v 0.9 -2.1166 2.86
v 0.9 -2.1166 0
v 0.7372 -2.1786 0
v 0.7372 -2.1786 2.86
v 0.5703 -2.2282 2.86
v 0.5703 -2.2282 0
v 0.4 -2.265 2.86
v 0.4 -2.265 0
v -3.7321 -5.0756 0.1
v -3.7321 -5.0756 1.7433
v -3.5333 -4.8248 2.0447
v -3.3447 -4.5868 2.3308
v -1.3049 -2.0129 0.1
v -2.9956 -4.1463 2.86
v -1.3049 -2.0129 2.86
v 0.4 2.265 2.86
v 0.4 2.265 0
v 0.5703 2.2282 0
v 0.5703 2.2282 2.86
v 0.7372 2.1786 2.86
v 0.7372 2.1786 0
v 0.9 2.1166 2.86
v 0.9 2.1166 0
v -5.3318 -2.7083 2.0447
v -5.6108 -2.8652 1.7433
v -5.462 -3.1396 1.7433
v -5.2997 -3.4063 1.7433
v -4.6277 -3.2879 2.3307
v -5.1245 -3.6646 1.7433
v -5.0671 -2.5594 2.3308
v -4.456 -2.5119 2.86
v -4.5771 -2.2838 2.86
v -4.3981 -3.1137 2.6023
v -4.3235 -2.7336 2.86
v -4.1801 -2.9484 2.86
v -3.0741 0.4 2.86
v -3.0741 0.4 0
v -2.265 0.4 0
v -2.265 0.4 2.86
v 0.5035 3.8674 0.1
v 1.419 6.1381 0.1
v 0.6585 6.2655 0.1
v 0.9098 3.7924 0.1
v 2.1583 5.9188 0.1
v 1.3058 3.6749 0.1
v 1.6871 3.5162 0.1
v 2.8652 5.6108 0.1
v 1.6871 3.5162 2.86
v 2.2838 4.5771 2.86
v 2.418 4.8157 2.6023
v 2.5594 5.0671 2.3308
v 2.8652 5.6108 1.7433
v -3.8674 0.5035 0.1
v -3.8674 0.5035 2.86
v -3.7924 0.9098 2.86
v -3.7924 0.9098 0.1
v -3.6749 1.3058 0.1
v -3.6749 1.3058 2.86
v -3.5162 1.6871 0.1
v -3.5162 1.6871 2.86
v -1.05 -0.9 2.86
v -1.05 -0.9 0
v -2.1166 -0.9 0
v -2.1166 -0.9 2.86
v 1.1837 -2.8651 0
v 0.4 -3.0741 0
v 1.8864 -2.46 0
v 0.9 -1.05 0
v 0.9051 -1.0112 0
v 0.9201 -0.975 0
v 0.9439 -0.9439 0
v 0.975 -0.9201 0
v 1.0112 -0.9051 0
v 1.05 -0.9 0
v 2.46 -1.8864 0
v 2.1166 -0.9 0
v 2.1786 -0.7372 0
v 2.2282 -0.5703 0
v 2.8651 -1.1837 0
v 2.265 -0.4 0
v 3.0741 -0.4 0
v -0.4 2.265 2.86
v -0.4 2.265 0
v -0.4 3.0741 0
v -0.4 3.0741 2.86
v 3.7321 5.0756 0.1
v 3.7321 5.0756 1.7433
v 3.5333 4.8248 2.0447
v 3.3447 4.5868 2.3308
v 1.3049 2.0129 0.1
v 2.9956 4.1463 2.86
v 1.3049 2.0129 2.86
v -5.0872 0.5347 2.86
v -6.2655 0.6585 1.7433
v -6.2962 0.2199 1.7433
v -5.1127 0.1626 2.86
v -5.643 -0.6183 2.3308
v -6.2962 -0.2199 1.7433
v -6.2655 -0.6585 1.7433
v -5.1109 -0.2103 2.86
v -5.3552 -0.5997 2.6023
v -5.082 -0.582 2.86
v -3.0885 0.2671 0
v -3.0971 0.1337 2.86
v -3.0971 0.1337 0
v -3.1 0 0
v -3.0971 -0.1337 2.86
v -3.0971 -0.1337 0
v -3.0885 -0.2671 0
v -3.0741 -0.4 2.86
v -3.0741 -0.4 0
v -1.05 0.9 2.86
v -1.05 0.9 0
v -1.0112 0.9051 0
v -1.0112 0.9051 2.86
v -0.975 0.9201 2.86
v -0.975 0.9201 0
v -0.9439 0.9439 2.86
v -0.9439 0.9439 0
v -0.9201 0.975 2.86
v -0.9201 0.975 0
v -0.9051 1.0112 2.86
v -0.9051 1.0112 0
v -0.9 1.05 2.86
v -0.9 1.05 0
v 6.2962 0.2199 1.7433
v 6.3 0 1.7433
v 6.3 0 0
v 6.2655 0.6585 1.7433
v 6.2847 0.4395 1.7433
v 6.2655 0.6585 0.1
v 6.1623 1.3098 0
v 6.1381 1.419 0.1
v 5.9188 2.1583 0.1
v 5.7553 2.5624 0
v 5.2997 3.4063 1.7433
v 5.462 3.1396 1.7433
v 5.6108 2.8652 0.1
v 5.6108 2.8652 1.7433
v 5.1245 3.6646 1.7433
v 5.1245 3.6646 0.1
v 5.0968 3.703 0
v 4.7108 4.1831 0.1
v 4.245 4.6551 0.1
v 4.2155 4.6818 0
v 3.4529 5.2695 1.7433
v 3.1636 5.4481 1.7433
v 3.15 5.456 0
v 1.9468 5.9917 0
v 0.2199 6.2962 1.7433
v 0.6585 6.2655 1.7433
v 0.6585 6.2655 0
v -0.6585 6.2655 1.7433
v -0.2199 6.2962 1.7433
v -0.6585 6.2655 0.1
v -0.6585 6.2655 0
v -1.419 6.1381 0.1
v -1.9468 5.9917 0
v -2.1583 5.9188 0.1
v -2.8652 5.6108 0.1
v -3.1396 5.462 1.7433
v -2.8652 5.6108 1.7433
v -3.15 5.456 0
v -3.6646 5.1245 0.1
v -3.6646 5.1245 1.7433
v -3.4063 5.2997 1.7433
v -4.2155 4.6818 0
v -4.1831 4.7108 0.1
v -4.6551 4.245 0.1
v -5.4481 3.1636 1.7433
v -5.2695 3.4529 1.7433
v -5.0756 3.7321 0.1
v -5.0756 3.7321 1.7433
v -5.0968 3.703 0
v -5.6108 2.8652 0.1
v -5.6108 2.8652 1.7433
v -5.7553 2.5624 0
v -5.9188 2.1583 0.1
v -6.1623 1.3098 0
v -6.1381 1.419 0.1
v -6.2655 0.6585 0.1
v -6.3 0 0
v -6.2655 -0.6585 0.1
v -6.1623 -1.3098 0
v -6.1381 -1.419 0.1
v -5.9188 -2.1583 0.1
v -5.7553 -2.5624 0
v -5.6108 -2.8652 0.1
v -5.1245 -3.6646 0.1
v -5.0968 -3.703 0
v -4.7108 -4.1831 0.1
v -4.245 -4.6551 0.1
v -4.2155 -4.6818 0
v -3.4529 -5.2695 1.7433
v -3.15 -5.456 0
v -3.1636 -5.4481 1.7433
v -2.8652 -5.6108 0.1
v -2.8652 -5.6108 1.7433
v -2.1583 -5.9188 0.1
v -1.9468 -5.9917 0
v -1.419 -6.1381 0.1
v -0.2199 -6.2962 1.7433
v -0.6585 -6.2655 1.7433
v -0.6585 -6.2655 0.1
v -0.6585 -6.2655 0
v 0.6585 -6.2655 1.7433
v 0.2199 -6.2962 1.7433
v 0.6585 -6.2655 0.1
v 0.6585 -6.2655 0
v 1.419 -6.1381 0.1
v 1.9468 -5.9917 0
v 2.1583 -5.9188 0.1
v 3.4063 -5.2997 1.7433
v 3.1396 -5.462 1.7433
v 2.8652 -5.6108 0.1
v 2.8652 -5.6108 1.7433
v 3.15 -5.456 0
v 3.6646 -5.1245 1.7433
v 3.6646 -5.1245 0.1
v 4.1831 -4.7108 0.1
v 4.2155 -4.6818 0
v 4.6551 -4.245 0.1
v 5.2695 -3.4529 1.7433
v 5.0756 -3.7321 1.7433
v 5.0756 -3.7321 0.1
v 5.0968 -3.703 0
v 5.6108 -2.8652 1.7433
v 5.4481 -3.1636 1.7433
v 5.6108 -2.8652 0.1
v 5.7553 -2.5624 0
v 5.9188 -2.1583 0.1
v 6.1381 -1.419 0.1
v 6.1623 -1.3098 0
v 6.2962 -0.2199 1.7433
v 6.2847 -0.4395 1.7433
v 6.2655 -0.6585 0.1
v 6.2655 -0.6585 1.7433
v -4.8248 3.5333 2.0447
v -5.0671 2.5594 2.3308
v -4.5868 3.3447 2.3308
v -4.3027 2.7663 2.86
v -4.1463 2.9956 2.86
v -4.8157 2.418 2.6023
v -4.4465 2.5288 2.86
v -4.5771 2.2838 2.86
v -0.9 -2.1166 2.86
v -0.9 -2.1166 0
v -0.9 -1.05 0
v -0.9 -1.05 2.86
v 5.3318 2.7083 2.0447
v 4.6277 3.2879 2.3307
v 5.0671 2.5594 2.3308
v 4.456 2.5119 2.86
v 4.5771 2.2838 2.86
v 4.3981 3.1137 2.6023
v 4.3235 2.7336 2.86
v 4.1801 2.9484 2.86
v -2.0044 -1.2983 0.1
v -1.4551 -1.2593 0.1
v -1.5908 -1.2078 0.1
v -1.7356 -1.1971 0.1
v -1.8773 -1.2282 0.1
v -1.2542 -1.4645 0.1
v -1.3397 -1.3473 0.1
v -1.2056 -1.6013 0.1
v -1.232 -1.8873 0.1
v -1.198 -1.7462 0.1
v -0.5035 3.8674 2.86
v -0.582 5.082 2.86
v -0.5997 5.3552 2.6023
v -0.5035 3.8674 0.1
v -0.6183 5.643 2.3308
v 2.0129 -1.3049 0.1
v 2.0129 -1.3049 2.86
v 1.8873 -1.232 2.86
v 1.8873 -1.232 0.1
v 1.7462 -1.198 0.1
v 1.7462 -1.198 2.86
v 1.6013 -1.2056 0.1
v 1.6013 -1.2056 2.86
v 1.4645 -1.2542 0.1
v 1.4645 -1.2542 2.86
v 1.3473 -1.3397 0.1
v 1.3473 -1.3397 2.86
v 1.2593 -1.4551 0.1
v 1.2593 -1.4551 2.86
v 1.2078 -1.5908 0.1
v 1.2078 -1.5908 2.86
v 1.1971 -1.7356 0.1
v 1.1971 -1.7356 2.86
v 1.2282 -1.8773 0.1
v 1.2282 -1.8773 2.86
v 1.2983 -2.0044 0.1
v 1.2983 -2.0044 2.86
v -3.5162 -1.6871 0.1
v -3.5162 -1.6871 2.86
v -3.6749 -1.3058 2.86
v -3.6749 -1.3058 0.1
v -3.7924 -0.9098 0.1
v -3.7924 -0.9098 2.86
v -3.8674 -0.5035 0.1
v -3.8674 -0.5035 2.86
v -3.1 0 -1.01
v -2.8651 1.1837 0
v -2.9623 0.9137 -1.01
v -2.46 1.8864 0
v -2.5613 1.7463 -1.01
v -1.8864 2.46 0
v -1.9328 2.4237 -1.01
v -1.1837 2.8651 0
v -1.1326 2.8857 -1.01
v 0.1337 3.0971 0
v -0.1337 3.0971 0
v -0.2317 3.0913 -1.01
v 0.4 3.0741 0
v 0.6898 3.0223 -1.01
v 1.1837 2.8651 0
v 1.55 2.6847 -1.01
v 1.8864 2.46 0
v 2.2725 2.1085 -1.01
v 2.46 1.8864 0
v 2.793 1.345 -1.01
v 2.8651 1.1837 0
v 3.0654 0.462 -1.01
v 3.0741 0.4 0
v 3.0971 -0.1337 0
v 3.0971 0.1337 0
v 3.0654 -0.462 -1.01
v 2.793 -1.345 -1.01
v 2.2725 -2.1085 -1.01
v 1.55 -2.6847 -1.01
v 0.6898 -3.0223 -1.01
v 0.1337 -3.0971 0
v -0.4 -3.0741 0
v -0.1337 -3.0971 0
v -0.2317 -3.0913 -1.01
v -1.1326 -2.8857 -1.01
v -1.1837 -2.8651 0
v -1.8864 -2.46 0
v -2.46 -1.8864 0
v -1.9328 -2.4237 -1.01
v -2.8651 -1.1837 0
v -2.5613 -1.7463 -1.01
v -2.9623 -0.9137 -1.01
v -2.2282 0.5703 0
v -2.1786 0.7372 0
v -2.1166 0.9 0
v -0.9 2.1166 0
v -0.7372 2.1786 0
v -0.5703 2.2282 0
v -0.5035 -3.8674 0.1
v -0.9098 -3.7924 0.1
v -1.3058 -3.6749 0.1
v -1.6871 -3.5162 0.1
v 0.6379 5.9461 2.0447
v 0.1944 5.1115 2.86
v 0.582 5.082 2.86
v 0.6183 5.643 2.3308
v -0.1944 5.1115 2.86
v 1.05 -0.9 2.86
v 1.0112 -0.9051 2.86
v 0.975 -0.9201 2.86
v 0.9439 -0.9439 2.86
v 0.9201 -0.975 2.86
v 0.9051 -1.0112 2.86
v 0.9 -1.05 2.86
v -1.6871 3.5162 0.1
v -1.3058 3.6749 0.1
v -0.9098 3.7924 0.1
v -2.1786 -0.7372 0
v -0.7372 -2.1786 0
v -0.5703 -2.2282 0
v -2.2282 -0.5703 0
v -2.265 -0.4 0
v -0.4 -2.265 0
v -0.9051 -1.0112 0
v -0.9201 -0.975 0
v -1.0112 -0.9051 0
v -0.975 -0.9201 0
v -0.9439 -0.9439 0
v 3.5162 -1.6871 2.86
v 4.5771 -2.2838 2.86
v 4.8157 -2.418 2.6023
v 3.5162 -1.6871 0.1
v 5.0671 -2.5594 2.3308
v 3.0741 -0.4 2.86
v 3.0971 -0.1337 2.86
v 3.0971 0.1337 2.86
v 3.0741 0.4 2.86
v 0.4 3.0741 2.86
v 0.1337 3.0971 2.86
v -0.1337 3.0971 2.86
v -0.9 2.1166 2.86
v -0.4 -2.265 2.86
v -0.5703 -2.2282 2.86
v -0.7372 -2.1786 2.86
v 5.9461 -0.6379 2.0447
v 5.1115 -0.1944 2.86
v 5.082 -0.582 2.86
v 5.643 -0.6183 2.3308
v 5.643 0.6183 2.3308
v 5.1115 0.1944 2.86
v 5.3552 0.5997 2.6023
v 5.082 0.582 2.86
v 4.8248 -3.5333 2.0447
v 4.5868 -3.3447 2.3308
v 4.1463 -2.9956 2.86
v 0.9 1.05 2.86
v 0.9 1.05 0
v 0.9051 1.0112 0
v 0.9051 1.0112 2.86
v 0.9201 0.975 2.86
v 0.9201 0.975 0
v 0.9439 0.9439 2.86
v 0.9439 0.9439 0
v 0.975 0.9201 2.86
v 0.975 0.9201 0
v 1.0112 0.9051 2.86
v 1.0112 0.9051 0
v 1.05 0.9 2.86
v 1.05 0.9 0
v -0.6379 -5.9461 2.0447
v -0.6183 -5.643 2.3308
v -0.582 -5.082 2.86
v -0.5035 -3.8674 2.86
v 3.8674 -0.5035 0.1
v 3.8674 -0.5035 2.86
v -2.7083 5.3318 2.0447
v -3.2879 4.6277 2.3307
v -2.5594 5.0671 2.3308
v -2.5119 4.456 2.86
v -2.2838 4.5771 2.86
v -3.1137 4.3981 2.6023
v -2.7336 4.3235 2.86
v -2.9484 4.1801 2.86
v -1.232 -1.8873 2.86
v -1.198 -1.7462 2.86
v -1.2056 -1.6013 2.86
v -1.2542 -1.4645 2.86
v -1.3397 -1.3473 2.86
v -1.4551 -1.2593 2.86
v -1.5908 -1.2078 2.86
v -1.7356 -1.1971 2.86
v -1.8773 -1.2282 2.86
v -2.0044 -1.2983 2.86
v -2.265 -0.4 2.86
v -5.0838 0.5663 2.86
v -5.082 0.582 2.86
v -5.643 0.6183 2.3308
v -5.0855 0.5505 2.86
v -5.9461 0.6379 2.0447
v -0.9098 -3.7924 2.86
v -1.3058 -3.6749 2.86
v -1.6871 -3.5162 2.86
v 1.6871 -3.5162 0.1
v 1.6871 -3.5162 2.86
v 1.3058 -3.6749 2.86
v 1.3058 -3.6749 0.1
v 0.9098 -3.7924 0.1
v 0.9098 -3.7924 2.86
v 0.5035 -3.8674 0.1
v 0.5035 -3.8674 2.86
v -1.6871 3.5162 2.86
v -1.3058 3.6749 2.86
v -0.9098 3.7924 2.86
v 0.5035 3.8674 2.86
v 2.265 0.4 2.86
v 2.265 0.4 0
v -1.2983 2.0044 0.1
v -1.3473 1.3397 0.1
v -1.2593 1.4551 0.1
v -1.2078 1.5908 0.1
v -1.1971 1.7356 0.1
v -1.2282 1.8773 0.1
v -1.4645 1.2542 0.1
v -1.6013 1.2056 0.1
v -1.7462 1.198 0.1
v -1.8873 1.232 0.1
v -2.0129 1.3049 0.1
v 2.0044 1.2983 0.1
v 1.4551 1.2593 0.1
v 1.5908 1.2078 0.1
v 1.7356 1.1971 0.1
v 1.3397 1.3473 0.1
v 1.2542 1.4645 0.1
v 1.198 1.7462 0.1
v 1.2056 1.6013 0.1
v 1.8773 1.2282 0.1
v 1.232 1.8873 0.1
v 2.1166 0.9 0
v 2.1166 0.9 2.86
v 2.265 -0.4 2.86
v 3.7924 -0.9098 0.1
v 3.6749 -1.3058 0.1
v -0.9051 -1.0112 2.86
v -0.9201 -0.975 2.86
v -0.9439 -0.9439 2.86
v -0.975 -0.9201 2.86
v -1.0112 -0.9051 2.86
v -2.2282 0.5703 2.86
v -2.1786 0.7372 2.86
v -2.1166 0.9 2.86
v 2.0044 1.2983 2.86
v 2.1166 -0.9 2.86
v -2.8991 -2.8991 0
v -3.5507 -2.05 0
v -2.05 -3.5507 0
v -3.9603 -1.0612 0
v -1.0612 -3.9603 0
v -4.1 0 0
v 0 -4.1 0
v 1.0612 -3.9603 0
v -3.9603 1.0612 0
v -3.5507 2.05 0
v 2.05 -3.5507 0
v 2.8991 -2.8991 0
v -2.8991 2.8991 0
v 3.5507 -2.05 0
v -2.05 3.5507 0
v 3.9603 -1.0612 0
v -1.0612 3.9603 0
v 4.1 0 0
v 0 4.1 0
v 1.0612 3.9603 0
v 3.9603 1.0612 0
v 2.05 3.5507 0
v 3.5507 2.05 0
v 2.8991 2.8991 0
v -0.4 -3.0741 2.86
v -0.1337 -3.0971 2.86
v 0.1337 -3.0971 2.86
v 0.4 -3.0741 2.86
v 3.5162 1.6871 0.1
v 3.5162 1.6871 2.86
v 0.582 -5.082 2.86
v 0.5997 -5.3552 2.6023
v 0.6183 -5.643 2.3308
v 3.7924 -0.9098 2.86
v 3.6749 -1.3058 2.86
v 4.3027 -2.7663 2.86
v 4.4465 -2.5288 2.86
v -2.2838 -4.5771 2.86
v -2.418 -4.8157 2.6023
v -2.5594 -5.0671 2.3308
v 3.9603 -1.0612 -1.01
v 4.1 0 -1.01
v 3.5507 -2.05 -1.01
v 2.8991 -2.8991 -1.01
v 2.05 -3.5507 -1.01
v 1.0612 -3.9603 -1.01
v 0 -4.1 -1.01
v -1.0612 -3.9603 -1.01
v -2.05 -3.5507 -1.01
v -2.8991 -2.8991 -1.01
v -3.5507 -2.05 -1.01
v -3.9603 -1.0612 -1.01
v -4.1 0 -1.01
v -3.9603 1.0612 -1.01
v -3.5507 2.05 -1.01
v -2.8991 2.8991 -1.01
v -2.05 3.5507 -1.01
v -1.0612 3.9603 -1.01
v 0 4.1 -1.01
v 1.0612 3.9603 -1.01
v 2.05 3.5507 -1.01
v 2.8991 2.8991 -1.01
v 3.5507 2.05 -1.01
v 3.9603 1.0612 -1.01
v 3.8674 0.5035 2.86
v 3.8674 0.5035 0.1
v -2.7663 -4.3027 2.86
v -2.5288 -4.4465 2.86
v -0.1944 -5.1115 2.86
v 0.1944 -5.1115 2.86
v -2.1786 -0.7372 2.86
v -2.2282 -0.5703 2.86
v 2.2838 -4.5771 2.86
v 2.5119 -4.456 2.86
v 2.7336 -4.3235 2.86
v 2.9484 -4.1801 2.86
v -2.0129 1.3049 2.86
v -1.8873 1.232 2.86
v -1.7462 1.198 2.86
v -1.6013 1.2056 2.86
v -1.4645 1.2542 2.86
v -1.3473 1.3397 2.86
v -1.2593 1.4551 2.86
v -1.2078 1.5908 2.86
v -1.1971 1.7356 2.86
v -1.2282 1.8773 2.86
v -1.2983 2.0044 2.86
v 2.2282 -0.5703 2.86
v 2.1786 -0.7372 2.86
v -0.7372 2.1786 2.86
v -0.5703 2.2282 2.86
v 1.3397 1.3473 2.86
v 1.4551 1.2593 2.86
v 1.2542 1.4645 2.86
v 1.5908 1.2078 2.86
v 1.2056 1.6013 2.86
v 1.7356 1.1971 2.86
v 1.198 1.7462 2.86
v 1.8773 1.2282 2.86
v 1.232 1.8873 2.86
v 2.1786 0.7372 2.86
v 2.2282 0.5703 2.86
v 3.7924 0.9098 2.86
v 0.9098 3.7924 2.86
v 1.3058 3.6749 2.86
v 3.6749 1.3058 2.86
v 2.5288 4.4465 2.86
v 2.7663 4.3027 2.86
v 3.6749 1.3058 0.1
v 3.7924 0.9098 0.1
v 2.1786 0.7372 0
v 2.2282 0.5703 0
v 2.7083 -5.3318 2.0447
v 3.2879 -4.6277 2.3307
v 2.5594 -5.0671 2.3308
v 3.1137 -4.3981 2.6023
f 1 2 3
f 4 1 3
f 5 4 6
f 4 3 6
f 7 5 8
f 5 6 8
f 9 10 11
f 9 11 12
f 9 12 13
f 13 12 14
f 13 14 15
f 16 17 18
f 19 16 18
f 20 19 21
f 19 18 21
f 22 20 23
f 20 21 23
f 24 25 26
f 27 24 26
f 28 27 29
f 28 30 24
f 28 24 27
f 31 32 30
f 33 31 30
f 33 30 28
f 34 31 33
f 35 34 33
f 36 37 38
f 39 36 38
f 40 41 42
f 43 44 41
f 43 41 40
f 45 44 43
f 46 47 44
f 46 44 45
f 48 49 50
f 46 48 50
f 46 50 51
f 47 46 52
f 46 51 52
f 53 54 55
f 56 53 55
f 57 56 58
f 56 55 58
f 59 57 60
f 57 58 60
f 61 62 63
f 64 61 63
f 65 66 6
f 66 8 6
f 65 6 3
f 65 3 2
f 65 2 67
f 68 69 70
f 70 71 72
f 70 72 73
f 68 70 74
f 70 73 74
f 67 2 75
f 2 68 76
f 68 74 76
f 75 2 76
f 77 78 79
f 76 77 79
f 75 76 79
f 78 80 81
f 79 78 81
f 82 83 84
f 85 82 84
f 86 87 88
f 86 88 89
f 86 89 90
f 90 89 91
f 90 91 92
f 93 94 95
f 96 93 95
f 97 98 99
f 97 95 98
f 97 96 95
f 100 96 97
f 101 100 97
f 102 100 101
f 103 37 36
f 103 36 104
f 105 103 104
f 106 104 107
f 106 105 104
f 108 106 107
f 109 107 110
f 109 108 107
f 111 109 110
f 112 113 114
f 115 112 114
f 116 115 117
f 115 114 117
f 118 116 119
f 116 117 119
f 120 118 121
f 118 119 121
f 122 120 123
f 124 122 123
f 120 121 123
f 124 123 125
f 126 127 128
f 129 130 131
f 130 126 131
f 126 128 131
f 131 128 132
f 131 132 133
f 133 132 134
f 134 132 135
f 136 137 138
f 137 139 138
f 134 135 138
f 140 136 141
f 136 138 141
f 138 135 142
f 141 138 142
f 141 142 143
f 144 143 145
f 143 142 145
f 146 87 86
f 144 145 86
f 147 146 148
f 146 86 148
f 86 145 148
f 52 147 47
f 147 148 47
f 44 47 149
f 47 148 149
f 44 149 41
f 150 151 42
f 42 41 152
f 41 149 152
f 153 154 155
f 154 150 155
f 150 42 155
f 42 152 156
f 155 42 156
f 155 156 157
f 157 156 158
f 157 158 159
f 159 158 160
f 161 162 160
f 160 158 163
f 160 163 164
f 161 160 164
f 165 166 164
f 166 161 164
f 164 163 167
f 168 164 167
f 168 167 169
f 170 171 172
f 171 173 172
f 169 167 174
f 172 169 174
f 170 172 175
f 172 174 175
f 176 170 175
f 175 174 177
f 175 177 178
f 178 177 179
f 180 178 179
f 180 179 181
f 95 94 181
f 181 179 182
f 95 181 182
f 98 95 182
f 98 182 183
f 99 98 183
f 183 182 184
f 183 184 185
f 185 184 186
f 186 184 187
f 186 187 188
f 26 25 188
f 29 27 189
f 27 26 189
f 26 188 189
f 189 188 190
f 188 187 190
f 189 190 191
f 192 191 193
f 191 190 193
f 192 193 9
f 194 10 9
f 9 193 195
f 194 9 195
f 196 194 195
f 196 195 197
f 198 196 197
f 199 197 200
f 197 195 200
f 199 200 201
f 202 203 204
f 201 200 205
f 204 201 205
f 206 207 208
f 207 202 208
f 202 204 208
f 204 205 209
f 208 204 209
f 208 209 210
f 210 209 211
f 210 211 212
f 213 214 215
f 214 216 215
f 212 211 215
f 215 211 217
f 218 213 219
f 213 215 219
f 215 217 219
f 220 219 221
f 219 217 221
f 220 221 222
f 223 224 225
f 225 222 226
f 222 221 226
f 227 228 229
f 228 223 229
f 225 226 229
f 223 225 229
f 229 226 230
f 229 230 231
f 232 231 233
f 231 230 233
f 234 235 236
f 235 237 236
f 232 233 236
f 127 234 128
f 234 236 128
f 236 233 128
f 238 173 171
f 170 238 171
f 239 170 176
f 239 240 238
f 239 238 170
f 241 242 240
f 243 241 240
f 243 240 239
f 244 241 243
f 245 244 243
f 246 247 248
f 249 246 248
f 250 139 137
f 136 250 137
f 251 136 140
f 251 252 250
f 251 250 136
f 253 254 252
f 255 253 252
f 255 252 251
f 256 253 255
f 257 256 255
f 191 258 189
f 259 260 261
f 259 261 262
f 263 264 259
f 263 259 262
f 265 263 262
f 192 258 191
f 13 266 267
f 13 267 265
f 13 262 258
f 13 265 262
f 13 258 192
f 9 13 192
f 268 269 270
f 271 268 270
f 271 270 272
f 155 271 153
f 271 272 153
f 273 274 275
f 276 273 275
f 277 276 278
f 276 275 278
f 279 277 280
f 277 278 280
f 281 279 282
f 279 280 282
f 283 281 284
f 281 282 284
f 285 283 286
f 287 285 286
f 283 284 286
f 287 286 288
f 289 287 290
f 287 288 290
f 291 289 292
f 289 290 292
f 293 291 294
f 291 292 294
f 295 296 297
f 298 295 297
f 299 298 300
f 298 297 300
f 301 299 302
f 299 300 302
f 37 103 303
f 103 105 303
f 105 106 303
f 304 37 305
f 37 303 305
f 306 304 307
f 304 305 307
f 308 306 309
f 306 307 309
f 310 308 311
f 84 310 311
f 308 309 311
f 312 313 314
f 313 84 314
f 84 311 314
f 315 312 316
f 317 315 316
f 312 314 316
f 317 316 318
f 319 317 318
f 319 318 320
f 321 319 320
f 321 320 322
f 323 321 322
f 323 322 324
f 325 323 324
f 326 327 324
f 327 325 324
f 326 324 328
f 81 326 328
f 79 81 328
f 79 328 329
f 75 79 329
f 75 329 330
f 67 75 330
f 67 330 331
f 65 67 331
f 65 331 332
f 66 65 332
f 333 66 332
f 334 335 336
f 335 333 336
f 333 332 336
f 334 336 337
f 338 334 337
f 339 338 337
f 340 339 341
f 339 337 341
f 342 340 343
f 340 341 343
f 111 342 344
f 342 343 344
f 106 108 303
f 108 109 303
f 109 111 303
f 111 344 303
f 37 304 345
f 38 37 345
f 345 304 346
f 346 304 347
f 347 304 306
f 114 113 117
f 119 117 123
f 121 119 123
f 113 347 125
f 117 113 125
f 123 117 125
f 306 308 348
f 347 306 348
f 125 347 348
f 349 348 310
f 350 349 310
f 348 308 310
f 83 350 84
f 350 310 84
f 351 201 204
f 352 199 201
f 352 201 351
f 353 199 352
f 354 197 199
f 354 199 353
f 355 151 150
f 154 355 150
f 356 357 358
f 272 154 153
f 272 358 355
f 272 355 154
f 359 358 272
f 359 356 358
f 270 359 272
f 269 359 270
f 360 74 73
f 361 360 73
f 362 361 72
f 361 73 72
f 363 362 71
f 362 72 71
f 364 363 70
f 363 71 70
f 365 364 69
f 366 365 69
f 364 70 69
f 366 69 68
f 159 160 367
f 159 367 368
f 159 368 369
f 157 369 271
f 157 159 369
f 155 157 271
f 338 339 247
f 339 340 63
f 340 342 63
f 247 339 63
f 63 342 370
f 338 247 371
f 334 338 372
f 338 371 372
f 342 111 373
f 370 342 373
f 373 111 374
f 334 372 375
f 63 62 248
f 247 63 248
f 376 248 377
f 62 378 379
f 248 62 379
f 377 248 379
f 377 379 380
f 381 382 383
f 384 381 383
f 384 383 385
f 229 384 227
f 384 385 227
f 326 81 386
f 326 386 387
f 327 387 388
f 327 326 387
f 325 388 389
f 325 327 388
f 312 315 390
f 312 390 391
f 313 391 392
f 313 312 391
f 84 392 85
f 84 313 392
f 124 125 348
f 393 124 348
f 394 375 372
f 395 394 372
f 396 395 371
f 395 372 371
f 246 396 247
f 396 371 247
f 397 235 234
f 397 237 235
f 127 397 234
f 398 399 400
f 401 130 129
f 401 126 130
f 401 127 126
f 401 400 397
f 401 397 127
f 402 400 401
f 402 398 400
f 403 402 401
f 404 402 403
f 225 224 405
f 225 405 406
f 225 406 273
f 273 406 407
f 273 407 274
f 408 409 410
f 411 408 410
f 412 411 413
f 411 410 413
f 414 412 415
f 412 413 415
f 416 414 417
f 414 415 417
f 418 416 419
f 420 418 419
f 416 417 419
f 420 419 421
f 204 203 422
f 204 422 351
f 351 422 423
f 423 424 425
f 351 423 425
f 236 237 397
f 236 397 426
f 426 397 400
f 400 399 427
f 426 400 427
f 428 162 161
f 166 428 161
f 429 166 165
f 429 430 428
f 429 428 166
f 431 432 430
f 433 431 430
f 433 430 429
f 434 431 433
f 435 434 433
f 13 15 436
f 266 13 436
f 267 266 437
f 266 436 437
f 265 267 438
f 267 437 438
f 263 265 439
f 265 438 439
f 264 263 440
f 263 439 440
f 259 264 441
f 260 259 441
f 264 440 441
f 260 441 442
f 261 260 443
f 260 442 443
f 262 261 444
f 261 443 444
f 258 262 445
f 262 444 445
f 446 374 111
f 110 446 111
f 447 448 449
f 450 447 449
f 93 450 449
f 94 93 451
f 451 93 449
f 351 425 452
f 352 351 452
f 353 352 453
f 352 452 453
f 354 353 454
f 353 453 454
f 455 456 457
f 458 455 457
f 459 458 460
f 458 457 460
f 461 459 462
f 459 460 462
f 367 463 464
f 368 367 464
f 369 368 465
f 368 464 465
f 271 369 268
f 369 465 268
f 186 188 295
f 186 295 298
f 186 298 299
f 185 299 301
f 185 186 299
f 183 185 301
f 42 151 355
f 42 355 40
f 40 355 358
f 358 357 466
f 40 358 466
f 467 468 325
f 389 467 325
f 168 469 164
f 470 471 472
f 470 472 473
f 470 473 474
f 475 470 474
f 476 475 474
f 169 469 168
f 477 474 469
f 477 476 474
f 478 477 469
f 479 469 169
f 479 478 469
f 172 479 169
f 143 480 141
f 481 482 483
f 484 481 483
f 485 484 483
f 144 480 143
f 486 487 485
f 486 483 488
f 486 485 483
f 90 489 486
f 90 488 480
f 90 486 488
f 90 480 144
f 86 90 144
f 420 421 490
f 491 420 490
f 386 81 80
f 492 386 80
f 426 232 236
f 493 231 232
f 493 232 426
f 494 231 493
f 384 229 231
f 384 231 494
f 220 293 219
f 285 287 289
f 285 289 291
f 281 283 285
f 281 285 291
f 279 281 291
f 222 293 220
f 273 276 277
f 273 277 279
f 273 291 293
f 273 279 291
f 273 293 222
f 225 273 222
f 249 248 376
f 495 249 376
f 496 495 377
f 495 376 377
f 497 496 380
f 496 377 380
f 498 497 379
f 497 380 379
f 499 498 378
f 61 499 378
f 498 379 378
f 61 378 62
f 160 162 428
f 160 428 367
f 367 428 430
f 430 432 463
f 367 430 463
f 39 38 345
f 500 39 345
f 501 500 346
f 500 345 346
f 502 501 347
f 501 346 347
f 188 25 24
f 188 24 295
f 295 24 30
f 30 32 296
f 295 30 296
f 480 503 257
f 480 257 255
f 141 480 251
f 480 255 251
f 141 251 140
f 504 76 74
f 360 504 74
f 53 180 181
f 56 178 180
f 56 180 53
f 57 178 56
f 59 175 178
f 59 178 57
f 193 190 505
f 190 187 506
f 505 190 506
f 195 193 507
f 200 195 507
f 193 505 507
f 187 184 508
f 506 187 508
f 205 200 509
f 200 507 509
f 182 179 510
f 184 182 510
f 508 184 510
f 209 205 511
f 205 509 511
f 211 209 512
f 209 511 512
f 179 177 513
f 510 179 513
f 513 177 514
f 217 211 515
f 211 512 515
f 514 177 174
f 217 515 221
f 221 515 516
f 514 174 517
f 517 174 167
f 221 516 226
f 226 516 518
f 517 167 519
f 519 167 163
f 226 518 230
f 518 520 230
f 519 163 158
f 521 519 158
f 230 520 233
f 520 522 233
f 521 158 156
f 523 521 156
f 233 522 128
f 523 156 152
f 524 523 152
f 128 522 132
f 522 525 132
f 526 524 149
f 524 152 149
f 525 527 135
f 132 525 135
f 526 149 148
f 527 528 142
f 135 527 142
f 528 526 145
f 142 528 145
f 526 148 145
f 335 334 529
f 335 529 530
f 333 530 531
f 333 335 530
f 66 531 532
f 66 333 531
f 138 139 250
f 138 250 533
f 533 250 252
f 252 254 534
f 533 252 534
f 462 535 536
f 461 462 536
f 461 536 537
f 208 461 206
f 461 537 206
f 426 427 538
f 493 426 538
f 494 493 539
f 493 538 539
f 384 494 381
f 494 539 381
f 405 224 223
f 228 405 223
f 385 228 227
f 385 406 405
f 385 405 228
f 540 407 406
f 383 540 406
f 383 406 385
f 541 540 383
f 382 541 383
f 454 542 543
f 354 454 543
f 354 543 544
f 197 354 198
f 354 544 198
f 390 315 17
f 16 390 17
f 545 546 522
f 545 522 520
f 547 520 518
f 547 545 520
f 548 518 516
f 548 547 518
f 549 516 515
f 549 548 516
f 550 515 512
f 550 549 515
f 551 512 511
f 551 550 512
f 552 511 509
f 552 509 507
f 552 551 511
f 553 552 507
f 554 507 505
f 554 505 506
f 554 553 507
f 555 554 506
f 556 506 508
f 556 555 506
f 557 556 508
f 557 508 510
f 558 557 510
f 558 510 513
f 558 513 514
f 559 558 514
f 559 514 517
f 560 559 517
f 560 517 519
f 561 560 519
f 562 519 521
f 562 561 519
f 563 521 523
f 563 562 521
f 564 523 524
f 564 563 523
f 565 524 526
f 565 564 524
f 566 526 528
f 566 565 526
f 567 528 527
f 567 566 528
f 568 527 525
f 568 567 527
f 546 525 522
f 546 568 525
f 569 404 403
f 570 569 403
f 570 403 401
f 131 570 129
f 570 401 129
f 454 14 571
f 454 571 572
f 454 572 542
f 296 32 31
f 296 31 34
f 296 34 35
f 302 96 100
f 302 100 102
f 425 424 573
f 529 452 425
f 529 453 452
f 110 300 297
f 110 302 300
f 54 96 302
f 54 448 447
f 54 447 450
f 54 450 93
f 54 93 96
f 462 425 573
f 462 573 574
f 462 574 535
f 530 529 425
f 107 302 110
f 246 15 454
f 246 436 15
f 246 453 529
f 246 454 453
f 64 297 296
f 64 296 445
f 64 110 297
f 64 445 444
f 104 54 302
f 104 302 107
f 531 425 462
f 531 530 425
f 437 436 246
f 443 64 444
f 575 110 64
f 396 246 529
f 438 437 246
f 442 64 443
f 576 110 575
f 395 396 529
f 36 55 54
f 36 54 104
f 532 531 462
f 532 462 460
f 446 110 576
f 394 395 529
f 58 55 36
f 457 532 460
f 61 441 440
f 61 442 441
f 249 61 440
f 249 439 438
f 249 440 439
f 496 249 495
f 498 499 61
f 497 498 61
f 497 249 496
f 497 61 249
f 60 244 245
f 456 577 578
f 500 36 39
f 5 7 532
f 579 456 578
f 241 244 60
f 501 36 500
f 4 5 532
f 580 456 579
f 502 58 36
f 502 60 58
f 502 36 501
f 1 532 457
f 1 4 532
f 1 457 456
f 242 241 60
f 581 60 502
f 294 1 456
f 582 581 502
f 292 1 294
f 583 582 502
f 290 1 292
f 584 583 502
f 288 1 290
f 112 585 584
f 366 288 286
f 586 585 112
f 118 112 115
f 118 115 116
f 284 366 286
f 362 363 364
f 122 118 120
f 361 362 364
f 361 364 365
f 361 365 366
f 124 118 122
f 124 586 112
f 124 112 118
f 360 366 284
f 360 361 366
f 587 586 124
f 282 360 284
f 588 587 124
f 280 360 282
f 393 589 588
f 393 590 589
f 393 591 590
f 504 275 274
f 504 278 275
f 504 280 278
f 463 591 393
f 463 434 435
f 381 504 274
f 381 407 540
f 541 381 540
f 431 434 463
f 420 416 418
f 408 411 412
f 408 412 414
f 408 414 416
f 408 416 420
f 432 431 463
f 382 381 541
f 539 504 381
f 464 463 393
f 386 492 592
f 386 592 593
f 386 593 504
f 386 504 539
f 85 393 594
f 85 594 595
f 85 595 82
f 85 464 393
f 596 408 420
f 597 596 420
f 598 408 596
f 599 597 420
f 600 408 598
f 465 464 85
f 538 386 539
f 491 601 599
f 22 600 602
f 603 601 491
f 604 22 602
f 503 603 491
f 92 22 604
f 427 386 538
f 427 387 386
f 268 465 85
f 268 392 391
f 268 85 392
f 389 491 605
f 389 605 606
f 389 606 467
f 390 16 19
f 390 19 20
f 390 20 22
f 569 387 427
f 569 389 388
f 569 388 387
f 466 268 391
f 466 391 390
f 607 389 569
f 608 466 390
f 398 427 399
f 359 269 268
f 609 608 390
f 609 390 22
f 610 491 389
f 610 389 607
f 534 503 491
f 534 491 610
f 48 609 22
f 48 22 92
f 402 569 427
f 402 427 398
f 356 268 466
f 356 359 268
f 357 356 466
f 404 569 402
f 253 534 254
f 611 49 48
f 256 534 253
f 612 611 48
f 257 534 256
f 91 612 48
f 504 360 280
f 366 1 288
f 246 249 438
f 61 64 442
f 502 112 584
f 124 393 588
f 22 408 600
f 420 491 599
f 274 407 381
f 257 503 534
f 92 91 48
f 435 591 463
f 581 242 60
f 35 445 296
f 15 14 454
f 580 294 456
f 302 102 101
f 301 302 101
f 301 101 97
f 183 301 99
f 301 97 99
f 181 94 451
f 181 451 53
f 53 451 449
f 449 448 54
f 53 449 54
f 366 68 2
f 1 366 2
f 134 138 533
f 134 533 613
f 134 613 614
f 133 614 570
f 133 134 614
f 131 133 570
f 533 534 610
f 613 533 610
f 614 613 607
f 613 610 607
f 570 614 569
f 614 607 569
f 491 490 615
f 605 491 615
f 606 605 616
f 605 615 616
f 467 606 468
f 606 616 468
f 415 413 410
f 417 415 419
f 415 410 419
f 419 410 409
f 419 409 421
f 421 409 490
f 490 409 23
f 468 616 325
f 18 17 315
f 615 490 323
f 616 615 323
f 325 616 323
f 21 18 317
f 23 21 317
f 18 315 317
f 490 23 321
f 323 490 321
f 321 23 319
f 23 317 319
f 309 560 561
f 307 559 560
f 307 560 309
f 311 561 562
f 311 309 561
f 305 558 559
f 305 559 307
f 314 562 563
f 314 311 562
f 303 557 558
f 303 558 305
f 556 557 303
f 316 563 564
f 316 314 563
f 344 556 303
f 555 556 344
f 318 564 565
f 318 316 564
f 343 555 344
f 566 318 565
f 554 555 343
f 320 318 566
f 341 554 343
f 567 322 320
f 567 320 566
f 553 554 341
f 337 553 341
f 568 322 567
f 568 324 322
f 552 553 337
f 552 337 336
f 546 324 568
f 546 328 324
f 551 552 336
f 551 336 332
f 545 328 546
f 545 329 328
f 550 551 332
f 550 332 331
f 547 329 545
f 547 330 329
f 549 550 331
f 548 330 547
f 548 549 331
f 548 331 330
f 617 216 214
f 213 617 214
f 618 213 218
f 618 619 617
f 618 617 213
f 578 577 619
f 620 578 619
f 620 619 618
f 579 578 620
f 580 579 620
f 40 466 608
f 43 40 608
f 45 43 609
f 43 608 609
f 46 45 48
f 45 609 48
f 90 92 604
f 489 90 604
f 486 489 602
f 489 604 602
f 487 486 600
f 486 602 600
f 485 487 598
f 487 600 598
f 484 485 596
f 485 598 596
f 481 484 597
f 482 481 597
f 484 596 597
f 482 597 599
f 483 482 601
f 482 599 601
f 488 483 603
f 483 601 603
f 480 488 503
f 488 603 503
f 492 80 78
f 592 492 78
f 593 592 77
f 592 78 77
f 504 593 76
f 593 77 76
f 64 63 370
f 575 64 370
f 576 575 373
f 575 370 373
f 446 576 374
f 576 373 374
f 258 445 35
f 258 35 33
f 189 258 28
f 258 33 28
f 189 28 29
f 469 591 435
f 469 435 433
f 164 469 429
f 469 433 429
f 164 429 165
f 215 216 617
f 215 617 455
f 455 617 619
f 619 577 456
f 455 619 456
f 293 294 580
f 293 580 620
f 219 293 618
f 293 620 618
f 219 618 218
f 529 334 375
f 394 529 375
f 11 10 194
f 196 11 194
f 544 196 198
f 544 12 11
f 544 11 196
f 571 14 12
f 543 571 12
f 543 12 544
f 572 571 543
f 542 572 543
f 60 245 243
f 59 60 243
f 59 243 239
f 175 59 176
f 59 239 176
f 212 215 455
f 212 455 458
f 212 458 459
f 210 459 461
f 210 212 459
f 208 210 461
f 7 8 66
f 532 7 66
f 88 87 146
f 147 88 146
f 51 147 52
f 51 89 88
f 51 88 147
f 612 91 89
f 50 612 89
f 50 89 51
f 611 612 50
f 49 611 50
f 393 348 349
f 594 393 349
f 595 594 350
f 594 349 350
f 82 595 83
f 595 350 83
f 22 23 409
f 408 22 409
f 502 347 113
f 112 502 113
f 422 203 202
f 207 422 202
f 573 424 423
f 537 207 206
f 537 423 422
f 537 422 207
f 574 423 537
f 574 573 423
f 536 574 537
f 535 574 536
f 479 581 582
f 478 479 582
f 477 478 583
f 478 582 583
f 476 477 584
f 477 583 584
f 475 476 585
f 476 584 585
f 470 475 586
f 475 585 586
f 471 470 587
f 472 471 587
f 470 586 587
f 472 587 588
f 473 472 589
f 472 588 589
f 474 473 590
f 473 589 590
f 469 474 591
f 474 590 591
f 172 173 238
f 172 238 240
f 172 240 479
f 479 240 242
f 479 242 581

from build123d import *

# Parameters (mm, degrees)
SKETCH1_R           = 6.3
BOSS_EXTRUDE1_DEPTH = 2.86
BOSS_EXTRUDE2_START = 1.01
SKETCH2_R           = 4.1
SKETCH2_R_2         = 3.1
BOSS_EXTRUDE2_DEPTH = 1.01
CUT_EXTRUDE1_START  = -2.76
CUT_EXTRUDE1_DEPTH  = 2.76
CIRPATTERN1_COUNT   = 4


with BuildPart() as part:
    # Sketch1 → Boss-Extrude1 (new body)
    with BuildSketch(Plane.XY):
        Circle(SKETCH1_R)
        with BuildLine():
            Line((-1.05, -0.9), (-2.116601049, -0.9))
            ThreePointArc((-2.116601049, -0.9), (-2.204993905, -0.654218524), (-2.264950331, -0.4))
            Line((-2.264950331, -0.4), (-3.07408523, -0.4))
            ThreePointArc((-3.07408523, -0.4), (-3.1, 0), (-3.07408523, 0.4))
            Line((-3.07408523, 0.4), (-2.264950331, 0.4))
            ThreePointArc((-2.264950331, 0.4), (-2.204993905, 0.654218524), (-2.116601049, 0.9))
            Line((-2.116601049, 0.9), (-1.05, 0.9))
            ThreePointArc((-1.05, 0.9), (-0.943933983, 0.943933983), (-0.9, 1.05))
            Line((-0.9, 1.05), (-0.9, 2.116601049))
            ThreePointArc((-0.9, 2.116601049), (-0.654218524, 2.204993905), (-0.4, 2.264950331))
            Line((-0.4, 2.264950331), (-0.4, 3.07408523))
            ThreePointArc((-0.4, 3.07408523), (0, 3.1), (0.4, 3.07408523))
            Line((0.4, 3.07408523), (0.4, 2.264950331))
            ThreePointArc((0.4, 2.264950331), (0.654218524, 2.204993905), (0.9, 2.116601049))
            Line((0.9, 2.116601049), (0.9, 1.05))
            ThreePointArc((0.9, 1.05), (0.943933983, 0.943933983), (1.05, 0.9))
            Line((1.05, 0.9), (2.116601049, 0.9))
            ThreePointArc((2.116601049, 0.9), (2.204993905, 0.654218524), (2.264950331, 0.4))
            Line((2.264950331, 0.4), (3.07408523, 0.4))
            ThreePointArc((3.07408523, 0.4), (3.1, 0), (3.07408523, -0.4))
            Line((3.07408523, -0.4), (2.264950331, -0.4))
            ThreePointArc((2.264950331, -0.4), (2.204993905, -0.654218524), (2.116601049, -0.9))
            Line((2.116601049, -0.9), (1.05, -0.9))
            ThreePointArc((1.05, -0.9), (0.943933983, -0.943933983), (0.9, -1.05))
            Line((0.9, -1.05), (0.9, -2.116601049))
            ThreePointArc((0.9, -2.116601049), (0.654218524, -2.204993905), (0.4, -2.264950331))
            Line((0.4, -2.264950331), (0.4, -3.07408523))
            ThreePointArc((0.4, -3.07408523), (0, -3.1), (-0.4, -3.07408523))
            Line((-0.4, -3.07408523), (-0.4, -2.264950331))
            ThreePointArc((-0.4, -2.264950331), (-0.654218524, -2.204993905), (-0.9, -2.116601049))
            Line((-0.9, -2.116601049), (-0.9, -1.05))
            ThreePointArc((-0.9, -1.05), (-0.943933983, -0.943933983), (-1.05, -0.9))
        make_face(mode=Mode.SUBTRACT)
    extrude(amount=BOSS_EXTRUDE1_DEPTH)

    # Sketch2 → Boss-Extrude2 (add)
    with BuildSketch(Plane(origin=(0, 0, 0), x_dir=(-1, 0, 0), z_dir=(0, 0, -1)).offset(BOSS_EXTRUDE2_START)):
        Circle(SKETCH2_R)
        Circle(SKETCH2_R_2, mode=Mode.SUBTRACT)
    extrude(amount=-BOSS_EXTRUDE2_DEPTH)

    # Sketch3 → Cut-Extrude1 (cut)
    with BuildSketch(Plane.XY.offset(2.86).offset(CUT_EXTRUDE1_START)):
        with BuildLine():
            ThreePointArc((-1.687138839, 3.516185794), (-1.109327063, 3.738902709), (-0.503547315, 3.867355699))
            Line((-0.503547315, 3.867355699), (-0.658514541, 6.265489494))
            ThreePointArc((-0.658514541, 6.265489494), (-1.791989871, 6.039765915), (-2.865158016, 5.610781545))
            Line((-2.865158016, 5.610781545), (-1.687138839, 3.516185794))
        make_face()
        with BuildLine():
            Line((1.298290287, -2.004404983), (3.664644204, -5.124488546))
            ThreePointArc((3.664644204, -5.124488546), (4.425231419, -4.48411941), (5.075598647, -3.732063554))
            Line((5.075598647, -3.732063554), (2.012879929, -1.304861101))
            ThreePointArc((2.012879929, -1.304861101), (1.347288977, -1.339706092), (1.298290287, -2.004404983))
        make_face()
        with BuildLine():
            ThreePointArc((-3.867355699, 0.503547315), (-3.738902709, 1.109327063), (-3.516185794, 1.687138839))
            Line((-3.516185794, 1.687138839), (-5.610781545, 2.865158016))
            ThreePointArc((-5.610781545, 2.865158016), (-6.039765915, 1.791989871), (-6.265489494, 0.658514541))
            Line((-6.265489494, 0.658514541), (-3.867355699, 0.503547315))
        make_face()
    cut_extrude1 = extrude(amount=CUT_EXTRUDE1_DEPTH, mode=Mode.SUBTRACT)

    # CirPattern1: Cut-Extrude1 ×4 about axis
    cirpattern1_axis = Axis((0, 0, 2.86), (0, 0, 1))
    for i in range(1, CIRPATTERN1_COUNT):
        add(cut_extrude1.rotate(cirpattern1_axis, i * 360 / CIRPATTERN1_COUNT), mode=Mode.SUBTRACT)

    # Sketch5 → Cut-Revolve1 (revolve, cut)
    with BuildSketch(Plane(origin=(0, 0, 0), x_dir=(1, 0, 0), z_dir=(0, 1, 0))):
        Polygon((-6.59, -3.11), (-6.59, -1.47), (-4.85, -3.11), align=None)
    revolve(axis=Axis((0, 0, -2.797897232), (0, 0, 1)), mode=Mode.SUBTRACT)


solid = part.part
